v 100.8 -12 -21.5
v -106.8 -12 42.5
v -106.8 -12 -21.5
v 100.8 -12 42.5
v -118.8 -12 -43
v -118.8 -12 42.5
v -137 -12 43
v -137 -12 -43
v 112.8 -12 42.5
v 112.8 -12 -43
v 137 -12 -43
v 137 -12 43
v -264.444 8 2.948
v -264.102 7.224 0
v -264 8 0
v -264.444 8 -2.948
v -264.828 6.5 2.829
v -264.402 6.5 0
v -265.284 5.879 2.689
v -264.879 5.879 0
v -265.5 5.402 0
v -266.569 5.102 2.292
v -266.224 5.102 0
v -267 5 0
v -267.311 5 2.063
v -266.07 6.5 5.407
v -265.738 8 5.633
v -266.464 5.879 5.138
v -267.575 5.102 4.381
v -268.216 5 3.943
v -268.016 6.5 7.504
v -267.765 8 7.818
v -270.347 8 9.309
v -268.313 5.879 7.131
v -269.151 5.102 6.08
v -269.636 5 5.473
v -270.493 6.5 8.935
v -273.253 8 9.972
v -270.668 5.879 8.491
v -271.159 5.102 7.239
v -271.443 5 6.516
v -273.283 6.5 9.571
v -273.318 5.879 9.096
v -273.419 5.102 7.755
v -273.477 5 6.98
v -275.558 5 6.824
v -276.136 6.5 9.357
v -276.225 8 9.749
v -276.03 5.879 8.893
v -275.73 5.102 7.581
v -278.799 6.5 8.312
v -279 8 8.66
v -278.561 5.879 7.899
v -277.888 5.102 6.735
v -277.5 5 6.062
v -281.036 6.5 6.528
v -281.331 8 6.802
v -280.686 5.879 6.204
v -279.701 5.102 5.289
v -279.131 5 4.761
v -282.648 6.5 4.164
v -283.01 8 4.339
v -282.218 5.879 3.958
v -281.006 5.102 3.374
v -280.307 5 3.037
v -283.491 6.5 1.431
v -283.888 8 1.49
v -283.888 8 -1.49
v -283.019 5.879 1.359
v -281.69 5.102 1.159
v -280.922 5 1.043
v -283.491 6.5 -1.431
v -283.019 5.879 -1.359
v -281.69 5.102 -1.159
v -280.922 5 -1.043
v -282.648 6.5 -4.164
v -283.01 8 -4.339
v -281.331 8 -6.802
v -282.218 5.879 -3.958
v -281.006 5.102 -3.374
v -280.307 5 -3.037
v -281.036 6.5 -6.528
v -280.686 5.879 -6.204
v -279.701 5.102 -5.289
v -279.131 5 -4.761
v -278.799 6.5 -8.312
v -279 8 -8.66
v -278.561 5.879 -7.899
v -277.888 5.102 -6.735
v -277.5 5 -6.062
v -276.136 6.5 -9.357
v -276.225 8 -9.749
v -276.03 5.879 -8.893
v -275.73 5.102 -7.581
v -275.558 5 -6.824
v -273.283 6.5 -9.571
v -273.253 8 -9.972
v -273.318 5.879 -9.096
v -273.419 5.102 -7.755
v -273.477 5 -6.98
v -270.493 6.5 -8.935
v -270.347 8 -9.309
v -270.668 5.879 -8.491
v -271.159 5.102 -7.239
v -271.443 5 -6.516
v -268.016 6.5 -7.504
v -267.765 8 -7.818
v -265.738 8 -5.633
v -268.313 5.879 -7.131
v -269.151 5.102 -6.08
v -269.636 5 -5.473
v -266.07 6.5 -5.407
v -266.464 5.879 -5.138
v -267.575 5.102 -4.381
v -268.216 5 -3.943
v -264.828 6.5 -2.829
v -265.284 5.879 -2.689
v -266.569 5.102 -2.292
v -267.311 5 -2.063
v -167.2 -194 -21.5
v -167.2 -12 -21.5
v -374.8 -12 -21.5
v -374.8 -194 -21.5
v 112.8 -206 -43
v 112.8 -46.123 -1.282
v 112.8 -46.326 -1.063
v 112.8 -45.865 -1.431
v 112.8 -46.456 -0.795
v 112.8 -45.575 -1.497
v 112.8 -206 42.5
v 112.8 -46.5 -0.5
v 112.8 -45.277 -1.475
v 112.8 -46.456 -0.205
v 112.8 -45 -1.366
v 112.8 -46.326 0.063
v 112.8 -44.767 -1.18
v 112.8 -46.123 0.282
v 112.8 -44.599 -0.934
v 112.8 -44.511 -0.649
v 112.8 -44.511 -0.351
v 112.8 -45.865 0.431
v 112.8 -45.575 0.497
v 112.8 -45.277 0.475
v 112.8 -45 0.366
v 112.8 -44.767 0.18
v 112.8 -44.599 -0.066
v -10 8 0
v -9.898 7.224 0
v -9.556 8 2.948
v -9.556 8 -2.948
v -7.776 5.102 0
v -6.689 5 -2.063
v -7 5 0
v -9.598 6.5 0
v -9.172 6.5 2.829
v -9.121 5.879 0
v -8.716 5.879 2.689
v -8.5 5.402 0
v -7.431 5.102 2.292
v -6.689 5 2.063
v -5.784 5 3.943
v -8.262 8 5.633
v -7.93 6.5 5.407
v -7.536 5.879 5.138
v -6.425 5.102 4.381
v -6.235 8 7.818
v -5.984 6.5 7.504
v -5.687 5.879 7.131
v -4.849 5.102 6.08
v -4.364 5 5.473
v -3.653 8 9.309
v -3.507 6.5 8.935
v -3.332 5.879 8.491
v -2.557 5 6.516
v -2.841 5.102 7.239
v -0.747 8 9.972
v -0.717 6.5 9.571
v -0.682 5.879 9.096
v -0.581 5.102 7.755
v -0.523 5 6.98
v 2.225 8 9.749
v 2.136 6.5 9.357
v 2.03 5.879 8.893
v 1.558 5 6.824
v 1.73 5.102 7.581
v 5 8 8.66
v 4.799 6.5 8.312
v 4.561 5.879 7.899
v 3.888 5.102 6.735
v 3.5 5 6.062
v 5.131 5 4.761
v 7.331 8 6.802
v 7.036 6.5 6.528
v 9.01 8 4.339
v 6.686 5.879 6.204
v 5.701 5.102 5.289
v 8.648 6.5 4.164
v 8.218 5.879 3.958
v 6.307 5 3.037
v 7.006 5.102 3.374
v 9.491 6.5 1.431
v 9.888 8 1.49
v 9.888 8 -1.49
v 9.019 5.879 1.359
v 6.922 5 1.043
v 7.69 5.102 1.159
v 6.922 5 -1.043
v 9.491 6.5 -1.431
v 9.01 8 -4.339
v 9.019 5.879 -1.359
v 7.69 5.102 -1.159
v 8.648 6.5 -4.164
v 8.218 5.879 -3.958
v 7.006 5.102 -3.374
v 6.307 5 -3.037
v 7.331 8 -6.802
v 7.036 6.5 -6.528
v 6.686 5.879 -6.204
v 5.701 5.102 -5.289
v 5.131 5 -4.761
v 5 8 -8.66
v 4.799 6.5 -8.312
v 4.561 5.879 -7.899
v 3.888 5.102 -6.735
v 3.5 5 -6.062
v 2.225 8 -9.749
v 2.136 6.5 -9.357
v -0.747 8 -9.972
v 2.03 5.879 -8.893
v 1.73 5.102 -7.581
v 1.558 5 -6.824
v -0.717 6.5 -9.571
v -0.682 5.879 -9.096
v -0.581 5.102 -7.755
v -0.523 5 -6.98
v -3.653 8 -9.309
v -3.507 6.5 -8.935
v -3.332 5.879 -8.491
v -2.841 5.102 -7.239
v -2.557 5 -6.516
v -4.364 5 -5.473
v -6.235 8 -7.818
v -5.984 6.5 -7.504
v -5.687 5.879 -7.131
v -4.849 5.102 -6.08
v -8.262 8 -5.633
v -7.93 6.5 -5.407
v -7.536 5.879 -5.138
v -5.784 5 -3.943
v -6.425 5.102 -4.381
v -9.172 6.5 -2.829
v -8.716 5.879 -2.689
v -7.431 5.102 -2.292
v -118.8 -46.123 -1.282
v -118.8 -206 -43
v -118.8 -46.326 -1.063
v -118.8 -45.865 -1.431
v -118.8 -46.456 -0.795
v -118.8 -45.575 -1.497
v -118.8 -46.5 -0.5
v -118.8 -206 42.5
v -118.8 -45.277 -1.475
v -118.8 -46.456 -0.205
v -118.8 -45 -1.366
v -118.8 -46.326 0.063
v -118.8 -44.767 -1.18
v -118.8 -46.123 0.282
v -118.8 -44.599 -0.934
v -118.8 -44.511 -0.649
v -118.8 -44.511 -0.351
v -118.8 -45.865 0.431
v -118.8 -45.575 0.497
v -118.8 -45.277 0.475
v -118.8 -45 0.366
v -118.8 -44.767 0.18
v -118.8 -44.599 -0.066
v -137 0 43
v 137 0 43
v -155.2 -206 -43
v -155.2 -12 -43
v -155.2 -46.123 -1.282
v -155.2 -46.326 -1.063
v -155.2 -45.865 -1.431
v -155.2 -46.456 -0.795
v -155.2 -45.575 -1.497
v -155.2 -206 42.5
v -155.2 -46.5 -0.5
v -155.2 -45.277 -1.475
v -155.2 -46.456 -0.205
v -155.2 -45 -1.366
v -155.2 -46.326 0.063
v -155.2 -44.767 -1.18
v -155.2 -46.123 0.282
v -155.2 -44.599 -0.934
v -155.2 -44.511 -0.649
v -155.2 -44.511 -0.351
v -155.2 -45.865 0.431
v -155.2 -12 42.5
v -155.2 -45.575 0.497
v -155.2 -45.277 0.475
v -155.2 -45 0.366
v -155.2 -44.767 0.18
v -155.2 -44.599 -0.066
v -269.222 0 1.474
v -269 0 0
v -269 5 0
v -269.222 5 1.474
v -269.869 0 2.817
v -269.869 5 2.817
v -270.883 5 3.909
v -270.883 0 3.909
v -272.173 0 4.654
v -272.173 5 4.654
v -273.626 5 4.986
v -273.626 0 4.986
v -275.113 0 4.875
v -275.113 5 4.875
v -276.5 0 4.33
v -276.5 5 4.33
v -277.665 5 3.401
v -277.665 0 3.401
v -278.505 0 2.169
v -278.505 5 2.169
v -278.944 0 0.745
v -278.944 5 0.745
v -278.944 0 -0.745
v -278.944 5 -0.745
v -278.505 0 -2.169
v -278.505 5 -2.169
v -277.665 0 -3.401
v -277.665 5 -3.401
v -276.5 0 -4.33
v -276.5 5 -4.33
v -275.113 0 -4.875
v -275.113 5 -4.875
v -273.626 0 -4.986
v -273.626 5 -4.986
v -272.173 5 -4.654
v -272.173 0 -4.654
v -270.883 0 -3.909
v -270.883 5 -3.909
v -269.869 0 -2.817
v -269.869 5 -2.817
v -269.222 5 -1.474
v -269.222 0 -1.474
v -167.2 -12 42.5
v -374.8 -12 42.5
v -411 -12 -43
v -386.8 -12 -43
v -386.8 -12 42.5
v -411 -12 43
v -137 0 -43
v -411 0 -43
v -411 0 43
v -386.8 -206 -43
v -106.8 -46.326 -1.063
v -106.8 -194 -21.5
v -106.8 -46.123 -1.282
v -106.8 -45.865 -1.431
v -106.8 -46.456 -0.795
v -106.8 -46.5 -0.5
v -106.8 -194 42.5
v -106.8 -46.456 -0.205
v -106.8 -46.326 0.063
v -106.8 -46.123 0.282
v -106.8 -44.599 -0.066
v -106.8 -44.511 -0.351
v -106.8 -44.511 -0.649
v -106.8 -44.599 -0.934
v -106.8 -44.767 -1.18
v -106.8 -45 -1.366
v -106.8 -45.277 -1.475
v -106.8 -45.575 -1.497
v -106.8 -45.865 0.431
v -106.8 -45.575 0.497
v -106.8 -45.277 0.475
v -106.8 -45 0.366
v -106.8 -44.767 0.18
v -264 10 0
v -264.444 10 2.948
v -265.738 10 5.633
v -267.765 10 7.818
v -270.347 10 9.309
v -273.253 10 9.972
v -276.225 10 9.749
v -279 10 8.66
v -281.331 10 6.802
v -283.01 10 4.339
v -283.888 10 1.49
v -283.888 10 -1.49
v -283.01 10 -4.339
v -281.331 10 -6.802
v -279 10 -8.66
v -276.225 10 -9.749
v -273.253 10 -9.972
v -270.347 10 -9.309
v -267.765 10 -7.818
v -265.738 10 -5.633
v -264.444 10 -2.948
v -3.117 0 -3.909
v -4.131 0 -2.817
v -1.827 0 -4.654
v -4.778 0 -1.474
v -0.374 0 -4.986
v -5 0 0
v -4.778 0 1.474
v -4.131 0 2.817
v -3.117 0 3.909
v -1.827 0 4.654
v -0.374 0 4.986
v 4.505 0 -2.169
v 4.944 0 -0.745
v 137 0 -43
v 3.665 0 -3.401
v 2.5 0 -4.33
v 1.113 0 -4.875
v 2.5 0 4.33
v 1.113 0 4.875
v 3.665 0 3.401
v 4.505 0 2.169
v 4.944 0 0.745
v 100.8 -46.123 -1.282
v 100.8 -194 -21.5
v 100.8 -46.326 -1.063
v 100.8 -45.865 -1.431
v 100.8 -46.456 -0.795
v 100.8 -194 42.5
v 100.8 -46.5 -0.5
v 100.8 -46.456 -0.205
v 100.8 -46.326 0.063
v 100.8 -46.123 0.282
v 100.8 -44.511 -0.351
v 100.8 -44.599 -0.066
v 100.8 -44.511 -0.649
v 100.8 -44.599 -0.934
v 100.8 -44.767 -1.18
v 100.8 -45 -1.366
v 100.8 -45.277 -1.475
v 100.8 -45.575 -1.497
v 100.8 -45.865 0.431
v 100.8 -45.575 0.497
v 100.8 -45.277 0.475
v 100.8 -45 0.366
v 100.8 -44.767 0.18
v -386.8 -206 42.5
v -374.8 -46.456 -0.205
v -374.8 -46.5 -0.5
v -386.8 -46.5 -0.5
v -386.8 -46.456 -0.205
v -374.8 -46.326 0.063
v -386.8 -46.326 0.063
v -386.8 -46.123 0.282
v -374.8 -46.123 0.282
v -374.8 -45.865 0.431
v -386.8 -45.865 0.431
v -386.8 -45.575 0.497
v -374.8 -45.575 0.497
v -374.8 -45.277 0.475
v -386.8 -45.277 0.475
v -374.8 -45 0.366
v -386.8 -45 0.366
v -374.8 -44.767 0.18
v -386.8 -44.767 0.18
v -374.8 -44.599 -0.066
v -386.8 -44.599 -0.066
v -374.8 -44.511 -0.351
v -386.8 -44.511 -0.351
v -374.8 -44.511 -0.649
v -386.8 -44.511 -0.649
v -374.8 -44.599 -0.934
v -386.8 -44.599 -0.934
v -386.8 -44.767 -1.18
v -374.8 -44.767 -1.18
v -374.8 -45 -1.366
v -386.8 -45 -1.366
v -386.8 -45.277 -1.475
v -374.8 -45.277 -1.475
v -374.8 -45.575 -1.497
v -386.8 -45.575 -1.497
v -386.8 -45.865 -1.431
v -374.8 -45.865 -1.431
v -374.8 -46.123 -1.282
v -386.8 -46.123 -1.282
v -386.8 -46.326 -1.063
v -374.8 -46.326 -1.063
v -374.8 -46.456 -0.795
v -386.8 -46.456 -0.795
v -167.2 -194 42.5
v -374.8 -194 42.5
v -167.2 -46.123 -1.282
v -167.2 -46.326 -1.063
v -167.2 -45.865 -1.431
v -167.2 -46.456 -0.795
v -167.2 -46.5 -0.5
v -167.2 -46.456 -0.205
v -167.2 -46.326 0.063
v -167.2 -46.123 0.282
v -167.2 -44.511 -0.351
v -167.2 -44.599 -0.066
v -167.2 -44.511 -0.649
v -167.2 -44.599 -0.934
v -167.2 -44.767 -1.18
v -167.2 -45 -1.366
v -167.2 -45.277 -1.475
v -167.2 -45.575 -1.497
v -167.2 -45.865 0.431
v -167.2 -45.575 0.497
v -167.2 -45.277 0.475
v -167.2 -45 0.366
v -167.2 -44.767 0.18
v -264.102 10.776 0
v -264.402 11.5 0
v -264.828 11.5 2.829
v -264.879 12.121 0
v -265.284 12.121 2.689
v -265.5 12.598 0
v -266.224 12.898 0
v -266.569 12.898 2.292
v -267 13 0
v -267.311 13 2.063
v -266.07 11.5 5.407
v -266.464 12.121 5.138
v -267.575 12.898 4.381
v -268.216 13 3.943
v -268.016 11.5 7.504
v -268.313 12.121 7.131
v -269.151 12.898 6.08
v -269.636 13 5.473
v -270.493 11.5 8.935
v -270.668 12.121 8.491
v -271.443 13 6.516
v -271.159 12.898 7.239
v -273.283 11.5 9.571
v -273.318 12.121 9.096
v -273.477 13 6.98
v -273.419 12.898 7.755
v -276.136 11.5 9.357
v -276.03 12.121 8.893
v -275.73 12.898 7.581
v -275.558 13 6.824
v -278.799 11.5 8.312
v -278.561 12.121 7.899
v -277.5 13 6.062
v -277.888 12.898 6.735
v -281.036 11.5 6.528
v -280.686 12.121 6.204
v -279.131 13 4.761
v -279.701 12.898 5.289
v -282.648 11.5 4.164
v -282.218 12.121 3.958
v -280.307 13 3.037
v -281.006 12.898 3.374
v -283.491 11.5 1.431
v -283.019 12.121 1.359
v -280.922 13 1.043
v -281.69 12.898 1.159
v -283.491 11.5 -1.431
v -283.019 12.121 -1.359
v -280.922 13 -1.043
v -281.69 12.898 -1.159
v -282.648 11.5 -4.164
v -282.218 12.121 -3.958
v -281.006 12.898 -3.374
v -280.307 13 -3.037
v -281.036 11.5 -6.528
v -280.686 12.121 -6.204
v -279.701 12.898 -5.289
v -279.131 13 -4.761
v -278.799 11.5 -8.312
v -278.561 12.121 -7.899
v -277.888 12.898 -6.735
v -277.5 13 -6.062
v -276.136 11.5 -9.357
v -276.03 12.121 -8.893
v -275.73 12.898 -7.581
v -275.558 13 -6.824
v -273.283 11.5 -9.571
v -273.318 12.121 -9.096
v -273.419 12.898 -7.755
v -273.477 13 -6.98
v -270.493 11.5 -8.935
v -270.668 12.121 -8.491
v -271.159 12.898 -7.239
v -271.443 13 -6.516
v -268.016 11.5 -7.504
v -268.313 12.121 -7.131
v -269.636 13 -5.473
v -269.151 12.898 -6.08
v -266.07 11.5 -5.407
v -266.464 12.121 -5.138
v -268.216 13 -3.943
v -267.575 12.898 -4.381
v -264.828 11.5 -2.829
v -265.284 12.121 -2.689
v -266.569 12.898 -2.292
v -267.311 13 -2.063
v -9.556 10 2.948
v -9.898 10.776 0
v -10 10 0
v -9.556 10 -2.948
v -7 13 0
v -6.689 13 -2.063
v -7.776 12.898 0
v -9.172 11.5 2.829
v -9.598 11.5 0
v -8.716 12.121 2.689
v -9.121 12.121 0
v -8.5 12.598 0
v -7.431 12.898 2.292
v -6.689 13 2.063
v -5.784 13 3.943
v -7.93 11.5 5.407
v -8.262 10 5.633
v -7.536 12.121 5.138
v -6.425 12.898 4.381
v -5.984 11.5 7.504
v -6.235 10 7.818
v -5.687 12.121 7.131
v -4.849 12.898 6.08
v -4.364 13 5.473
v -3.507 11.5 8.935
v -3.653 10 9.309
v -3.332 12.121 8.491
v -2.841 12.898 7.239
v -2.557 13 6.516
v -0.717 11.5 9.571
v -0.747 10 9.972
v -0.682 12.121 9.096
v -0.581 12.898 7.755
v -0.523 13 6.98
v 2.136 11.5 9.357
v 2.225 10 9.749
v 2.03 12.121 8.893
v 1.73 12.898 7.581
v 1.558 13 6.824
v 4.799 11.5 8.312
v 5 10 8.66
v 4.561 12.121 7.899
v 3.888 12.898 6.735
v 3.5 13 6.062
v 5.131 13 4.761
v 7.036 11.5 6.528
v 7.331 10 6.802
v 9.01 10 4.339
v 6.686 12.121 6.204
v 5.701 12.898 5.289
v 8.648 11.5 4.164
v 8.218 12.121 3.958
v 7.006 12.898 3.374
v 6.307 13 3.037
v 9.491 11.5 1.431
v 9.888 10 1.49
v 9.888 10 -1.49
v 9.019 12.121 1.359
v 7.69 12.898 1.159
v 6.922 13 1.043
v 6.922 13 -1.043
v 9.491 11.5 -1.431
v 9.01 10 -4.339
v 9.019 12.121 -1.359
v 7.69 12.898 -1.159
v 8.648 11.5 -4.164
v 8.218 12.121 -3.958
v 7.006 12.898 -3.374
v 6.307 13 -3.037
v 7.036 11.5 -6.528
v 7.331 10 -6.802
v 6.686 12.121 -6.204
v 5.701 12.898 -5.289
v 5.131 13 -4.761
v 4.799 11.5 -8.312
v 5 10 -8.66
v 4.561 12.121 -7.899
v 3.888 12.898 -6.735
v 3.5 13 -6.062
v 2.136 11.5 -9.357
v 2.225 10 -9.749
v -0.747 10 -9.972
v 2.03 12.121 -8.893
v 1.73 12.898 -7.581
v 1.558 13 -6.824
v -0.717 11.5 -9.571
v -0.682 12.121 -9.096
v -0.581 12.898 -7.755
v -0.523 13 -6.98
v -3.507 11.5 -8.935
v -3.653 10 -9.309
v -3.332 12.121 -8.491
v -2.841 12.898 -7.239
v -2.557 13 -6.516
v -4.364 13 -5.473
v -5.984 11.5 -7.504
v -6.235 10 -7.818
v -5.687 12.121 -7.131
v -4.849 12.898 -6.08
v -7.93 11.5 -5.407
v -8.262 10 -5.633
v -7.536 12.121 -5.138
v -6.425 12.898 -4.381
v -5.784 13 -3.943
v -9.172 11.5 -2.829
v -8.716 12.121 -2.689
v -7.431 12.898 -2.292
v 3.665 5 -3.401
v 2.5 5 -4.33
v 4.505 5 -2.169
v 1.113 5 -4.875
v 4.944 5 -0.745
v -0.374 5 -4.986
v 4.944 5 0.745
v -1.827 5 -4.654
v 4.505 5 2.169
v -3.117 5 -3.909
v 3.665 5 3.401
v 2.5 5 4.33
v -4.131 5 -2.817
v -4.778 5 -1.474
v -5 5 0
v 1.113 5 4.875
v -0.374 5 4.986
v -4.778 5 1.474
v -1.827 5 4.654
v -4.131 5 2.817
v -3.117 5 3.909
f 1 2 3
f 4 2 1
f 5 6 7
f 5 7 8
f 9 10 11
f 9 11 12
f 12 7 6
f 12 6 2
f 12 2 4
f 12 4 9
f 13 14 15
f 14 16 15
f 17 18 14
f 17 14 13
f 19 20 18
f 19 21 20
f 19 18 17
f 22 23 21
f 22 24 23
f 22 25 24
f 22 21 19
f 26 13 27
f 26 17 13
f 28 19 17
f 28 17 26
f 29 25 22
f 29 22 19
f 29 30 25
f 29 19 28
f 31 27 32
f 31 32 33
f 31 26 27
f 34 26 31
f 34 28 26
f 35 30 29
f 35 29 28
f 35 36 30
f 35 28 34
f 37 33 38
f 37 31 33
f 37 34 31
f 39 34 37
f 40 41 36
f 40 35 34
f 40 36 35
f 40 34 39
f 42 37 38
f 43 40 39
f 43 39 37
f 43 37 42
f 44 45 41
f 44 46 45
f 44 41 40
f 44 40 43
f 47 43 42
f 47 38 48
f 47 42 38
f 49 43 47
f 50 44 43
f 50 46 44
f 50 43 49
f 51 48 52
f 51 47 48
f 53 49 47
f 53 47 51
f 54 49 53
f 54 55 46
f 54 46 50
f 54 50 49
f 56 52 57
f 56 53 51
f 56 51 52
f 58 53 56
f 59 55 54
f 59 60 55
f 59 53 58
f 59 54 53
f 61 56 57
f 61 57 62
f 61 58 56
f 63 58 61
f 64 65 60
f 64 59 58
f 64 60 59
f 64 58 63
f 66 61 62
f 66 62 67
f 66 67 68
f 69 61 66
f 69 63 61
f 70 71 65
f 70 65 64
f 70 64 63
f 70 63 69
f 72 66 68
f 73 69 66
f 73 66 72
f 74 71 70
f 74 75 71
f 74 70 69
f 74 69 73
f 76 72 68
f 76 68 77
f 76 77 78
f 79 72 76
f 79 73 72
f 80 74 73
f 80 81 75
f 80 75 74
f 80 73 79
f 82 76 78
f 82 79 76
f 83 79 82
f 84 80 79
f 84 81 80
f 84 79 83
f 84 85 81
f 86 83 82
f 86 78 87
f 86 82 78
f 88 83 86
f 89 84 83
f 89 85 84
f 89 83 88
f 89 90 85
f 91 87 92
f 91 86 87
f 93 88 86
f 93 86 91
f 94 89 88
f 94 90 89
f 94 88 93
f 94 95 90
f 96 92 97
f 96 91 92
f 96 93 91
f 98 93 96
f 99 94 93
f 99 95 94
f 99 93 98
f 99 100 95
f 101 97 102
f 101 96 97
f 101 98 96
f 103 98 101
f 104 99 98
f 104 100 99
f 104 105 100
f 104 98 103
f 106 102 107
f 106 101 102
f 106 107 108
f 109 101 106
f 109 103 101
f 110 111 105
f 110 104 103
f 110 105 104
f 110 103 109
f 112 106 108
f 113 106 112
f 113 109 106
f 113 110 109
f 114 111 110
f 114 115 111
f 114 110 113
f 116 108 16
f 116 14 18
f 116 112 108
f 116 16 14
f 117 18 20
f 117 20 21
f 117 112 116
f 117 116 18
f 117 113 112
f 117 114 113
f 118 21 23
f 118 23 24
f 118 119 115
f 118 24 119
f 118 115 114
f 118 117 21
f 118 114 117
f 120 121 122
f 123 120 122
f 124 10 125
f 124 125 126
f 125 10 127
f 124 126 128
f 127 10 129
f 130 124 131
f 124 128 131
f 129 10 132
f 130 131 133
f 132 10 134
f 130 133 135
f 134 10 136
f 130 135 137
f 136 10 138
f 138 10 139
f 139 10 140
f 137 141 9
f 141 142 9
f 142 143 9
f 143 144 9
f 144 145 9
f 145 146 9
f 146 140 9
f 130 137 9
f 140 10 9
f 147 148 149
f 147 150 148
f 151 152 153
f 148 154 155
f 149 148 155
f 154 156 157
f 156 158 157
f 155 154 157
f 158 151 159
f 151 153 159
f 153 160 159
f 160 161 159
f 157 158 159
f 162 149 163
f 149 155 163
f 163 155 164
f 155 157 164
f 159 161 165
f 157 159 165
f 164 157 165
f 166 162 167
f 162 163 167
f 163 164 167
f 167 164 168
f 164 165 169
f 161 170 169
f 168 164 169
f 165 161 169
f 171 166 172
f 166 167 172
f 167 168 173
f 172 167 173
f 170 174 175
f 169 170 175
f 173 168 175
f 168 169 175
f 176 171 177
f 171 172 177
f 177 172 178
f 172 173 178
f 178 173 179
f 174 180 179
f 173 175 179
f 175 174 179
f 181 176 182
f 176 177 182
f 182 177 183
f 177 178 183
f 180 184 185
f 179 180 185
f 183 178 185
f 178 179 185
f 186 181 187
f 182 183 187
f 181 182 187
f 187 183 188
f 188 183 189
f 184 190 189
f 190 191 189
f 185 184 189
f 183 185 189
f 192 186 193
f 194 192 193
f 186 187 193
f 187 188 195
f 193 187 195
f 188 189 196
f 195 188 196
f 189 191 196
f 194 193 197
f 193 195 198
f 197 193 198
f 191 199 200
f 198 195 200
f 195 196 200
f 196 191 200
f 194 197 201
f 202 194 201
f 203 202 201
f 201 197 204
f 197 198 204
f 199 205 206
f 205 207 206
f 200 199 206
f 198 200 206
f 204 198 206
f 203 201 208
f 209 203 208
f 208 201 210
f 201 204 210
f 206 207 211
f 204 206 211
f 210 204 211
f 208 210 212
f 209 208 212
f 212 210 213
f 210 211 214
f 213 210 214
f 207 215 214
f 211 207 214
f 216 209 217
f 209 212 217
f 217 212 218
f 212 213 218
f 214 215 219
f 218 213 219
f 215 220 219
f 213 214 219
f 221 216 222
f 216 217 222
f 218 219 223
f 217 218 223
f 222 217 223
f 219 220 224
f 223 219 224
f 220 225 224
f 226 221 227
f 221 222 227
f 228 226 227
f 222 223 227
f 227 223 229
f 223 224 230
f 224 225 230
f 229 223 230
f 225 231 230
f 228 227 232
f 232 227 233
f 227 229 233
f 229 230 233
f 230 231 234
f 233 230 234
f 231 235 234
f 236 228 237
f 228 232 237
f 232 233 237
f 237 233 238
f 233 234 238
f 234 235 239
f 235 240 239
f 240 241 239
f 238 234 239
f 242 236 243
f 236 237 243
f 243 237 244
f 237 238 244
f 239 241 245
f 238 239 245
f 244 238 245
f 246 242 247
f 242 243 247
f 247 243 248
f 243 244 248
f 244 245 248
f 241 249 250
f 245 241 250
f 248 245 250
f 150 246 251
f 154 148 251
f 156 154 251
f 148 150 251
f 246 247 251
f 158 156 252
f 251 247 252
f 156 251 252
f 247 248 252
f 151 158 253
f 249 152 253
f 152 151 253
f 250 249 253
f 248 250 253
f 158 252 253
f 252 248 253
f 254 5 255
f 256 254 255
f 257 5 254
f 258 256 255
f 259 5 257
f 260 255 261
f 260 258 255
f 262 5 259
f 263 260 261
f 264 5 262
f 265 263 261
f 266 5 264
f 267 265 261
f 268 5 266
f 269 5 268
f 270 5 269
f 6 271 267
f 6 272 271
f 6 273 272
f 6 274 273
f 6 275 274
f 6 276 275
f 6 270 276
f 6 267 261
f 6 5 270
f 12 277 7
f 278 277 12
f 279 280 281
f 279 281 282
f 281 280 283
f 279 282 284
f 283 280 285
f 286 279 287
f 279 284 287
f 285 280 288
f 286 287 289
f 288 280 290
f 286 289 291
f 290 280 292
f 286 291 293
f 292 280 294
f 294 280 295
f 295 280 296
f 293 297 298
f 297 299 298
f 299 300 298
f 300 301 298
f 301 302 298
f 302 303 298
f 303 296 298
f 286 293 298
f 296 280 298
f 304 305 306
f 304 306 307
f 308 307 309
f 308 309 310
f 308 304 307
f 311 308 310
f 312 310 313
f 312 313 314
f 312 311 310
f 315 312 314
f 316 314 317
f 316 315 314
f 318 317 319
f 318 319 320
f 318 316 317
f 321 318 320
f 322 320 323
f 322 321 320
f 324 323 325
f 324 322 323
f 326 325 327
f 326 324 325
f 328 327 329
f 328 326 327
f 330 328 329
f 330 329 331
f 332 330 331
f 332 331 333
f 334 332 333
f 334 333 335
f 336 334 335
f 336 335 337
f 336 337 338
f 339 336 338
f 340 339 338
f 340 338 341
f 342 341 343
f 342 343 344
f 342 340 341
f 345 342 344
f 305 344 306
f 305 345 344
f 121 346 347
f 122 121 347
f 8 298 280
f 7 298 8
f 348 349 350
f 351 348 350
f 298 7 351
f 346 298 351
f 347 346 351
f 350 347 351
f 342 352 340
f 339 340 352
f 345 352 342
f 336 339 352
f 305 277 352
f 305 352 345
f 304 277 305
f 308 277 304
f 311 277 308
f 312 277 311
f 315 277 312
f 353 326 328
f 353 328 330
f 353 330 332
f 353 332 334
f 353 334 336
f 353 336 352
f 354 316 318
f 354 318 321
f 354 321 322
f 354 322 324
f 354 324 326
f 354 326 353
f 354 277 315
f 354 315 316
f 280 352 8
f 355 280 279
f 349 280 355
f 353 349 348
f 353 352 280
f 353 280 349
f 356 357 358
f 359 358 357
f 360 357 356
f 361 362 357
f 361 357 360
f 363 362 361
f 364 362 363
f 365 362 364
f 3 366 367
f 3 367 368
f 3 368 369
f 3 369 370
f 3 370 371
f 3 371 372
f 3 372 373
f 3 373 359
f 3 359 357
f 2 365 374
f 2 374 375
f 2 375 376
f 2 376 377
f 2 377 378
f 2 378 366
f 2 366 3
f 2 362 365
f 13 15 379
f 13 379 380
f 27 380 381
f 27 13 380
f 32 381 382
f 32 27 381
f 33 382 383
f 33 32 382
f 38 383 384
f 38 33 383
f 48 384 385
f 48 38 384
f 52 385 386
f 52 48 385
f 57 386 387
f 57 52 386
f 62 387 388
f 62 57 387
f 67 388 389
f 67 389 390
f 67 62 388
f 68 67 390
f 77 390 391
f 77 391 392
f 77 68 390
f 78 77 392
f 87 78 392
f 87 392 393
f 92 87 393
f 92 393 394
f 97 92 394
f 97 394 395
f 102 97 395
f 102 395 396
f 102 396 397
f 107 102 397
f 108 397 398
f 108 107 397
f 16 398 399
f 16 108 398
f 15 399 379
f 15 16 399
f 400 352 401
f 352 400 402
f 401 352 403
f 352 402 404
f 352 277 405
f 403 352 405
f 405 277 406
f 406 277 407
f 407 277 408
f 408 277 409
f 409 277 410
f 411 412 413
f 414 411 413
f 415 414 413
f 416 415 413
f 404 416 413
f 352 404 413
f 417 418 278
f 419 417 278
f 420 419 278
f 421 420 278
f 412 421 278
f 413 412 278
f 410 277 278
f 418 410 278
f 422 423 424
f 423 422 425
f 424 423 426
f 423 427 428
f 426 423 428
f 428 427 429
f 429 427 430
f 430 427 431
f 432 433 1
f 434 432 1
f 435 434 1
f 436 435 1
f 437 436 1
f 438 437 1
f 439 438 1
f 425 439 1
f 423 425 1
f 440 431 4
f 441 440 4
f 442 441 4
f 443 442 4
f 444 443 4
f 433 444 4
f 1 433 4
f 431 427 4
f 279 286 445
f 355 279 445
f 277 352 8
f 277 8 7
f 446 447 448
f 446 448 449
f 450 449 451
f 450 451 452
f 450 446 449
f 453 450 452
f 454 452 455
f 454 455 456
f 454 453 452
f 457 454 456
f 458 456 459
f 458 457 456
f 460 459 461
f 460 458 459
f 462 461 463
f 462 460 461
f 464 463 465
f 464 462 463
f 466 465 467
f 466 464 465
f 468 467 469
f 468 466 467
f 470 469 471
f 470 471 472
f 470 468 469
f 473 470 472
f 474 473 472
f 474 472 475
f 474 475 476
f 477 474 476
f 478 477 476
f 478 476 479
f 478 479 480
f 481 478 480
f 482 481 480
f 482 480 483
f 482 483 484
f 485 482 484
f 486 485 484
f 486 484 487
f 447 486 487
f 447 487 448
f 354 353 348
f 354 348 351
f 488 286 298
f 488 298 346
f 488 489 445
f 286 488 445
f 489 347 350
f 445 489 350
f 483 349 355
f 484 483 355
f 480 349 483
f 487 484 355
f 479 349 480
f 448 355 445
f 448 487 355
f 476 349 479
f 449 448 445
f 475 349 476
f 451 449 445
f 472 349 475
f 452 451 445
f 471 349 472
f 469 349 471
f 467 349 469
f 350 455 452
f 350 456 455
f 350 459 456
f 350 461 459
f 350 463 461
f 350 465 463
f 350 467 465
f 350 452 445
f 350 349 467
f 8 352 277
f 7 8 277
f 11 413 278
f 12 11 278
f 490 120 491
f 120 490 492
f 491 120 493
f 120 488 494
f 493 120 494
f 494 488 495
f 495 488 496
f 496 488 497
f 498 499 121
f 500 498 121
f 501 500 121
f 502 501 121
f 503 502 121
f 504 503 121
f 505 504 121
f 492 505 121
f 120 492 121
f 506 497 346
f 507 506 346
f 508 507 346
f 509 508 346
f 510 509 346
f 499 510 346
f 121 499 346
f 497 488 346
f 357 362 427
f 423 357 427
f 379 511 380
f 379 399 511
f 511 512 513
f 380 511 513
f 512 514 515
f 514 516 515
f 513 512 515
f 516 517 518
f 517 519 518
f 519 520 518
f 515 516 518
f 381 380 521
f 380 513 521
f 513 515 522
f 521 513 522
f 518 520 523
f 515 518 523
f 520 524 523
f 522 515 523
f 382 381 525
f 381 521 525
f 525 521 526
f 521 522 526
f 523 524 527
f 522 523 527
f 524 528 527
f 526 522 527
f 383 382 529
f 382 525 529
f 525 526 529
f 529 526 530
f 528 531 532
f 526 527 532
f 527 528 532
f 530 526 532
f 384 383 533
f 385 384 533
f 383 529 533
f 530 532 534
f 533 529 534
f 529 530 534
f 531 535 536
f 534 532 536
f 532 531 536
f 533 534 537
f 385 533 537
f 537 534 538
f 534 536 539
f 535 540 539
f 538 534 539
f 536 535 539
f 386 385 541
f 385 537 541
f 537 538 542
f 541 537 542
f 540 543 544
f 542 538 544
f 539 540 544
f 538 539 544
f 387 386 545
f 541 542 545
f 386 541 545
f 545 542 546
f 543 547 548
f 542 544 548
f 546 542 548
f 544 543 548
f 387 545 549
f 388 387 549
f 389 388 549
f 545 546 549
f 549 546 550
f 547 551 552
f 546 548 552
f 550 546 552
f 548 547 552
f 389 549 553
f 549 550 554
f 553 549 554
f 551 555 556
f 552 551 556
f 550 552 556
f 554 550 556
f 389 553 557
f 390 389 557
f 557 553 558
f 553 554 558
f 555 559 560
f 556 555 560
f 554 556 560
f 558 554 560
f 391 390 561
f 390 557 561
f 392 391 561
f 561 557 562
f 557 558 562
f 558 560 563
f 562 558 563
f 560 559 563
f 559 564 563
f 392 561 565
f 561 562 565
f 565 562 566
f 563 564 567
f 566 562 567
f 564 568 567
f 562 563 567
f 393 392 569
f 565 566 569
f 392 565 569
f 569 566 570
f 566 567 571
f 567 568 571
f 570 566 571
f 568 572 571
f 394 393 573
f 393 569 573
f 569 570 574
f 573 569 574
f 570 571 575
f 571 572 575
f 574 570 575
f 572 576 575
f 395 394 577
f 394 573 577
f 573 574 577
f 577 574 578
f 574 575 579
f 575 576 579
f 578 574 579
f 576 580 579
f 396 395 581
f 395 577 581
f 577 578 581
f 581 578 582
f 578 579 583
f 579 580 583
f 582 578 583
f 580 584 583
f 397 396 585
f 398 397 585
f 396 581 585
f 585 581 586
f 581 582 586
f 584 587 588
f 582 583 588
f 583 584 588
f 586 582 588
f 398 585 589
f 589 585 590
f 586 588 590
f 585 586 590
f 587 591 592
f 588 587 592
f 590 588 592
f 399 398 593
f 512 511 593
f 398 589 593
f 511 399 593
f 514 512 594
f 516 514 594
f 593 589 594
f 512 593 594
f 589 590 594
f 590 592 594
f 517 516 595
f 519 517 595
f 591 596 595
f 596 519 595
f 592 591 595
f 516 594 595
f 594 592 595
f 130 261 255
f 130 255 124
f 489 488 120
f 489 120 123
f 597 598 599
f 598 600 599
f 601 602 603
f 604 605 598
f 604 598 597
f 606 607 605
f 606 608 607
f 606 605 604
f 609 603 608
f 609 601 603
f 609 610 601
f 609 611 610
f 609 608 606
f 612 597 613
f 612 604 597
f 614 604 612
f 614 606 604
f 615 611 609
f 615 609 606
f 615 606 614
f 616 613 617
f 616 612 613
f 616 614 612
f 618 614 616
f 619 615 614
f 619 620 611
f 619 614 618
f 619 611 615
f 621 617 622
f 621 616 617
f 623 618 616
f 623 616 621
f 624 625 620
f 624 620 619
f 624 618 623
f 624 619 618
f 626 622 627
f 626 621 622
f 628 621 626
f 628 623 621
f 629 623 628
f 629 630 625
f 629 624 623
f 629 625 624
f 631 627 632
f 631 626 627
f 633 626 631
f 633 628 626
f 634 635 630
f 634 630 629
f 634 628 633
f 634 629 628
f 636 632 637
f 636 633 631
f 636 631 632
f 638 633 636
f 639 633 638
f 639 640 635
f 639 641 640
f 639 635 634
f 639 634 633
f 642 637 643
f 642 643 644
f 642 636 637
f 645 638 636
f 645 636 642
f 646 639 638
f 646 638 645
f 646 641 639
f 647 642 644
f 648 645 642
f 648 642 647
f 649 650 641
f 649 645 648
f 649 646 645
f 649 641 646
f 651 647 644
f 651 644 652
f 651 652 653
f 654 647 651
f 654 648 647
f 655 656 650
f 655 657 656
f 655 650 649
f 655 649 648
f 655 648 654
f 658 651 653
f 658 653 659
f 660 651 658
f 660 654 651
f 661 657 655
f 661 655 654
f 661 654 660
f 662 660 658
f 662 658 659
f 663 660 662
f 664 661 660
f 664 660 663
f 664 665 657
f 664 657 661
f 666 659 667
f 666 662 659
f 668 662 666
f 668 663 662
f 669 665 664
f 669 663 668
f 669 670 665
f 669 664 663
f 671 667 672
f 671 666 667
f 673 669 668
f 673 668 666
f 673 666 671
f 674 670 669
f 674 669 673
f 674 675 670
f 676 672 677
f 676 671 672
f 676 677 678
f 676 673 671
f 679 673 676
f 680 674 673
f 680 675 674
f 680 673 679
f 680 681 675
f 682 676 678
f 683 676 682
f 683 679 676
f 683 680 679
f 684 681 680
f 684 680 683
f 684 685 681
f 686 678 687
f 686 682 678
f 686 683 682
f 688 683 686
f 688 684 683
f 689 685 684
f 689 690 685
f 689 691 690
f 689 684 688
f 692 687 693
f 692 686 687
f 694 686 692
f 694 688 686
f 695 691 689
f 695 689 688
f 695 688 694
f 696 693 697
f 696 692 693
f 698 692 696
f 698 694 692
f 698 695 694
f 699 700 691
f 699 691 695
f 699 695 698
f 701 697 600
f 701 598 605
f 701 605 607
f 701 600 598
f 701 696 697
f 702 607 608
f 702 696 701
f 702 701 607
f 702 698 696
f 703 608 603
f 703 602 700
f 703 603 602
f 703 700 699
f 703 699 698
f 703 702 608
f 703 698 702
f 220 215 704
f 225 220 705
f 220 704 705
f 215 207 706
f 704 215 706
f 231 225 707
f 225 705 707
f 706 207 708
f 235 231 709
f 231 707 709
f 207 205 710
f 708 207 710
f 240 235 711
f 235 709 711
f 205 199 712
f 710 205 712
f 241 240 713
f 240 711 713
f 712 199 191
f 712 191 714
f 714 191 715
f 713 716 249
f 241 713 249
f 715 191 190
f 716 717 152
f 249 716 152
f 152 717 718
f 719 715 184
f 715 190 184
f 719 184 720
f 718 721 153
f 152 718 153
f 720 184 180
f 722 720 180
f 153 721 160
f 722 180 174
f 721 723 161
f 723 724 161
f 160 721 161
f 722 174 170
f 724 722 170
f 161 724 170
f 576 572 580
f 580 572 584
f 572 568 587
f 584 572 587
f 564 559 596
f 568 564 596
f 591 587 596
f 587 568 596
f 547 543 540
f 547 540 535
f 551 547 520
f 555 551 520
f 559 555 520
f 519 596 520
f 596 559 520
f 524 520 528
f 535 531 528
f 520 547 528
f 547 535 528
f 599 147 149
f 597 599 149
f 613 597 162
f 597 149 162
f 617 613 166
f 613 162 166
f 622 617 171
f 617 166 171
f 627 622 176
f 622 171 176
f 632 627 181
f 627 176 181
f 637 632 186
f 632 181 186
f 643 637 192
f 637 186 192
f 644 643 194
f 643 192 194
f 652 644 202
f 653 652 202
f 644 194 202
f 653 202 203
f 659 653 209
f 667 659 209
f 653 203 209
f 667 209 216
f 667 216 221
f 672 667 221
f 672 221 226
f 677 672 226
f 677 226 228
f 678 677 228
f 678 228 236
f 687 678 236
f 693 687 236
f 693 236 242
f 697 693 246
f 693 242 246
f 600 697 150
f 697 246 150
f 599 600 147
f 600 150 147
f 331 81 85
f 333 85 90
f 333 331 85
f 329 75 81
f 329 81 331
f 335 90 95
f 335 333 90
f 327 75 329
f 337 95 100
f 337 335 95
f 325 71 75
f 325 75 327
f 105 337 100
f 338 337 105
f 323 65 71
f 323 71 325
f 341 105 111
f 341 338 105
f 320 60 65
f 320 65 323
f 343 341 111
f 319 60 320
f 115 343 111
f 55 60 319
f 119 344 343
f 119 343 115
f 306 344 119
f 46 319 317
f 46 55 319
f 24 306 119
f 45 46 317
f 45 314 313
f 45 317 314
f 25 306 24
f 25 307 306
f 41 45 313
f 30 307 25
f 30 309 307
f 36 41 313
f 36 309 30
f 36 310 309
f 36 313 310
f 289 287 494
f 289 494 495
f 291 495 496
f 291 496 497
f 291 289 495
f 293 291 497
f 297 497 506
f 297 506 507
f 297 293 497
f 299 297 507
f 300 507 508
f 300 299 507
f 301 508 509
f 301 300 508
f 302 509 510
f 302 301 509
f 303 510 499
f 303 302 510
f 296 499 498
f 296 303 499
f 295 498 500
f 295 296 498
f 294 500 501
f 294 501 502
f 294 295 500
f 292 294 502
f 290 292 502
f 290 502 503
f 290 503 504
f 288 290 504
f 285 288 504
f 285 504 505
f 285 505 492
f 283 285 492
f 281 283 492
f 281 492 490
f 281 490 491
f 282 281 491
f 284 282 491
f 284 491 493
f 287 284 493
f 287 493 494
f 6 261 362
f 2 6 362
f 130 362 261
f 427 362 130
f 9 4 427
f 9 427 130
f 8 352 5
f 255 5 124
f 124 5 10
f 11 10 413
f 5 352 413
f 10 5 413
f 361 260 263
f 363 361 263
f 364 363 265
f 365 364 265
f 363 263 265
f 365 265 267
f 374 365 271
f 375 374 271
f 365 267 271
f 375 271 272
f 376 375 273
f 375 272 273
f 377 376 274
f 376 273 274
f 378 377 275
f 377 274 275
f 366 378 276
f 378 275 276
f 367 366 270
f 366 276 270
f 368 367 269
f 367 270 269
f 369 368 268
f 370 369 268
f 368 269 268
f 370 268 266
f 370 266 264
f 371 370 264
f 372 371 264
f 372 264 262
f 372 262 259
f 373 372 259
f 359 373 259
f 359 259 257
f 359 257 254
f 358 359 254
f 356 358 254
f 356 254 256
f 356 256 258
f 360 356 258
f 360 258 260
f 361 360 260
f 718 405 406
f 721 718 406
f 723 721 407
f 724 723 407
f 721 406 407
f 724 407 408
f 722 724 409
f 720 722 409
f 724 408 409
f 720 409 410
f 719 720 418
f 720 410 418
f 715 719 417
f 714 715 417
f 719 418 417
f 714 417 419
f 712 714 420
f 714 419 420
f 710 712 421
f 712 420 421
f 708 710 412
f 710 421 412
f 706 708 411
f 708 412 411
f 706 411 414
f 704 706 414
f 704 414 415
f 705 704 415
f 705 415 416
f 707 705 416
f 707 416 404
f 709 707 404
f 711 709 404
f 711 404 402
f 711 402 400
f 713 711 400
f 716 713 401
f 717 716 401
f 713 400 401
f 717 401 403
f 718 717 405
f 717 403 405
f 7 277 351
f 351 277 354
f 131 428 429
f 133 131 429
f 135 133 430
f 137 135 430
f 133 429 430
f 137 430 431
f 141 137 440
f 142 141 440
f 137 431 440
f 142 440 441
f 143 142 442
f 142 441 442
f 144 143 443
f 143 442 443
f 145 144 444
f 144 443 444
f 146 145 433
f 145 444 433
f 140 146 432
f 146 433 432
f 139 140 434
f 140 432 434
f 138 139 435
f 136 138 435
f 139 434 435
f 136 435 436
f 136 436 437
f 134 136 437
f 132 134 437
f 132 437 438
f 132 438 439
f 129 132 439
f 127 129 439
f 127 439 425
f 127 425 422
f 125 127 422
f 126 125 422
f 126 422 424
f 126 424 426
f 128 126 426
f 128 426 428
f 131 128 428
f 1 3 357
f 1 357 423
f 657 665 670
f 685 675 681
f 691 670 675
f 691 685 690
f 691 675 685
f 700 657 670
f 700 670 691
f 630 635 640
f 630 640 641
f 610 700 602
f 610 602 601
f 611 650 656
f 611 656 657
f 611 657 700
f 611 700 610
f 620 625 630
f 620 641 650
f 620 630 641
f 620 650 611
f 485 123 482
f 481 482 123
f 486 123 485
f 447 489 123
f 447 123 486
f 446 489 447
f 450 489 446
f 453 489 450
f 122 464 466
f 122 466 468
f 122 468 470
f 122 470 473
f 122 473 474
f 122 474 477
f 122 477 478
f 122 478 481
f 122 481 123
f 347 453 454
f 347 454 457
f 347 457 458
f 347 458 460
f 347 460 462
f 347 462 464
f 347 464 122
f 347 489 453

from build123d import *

# Parameters (mm, degrees)
F0_W     = 274
F0_H     = 86
F1_DEPTH = 12
F2_W     = 231.6
F2_H     = 85.5
F3_DEPTH = 194
F4_W     = 207.6
F4_H     = 182
F5_DEPTH = 64
F6_R     = 5
F7_DEPTH = 5
F13_R    = 10
F13_R_2  = 5
F8_DEPTH = 8
F14_R    = 3
F10_D    = 2


with BuildPart() as f1:
    # F0 (on Front) → F1 (new body)
    with BuildSketch(Plane.XZ):
        Rectangle(F0_W, F0_H)
    extrude(amount=F1_DEPTH)

    # F2 (on face) → F3 (join)
    with BuildSketch(Plane.XZ.offset(12)):
        with Locations((-3, -0.25)):
            Rectangle(F2_W, F2_H)
    extrude(amount=F3_DEPTH)

    # F4 (on face) → F5 (cut)
    with BuildSketch(Plane.XY.offset(42.5)):
        with Locations((-3, -103)):
            Rectangle(F4_W, F4_H)
    extrude(amount=-F5_DEPTH, mode=Mode.SUBTRACT)

    # F6 (on face) → F7 (join)
    with BuildSketch(Plane(origin=(0, 0, 0), x_dir=(-1, 0, 0), z_dir=(0, 1, 0))):
        Circle(F6_R)
    extrude(amount=F7_DEPTH)

    # F13 (on face) → F8 (join)
    with BuildSketch(Plane(origin=(0, 5, 0), x_dir=(-1, 0, 0), z_dir=(0, 1, 0))):
        Circle(F13_R)
        Circle(F13_R_2, mode=Mode.SUBTRACT)
        Circle(F13_R_2)
    extrude(amount=F8_DEPTH)

    # F14
    f14_edges = [f1.edges().sort_by_distance(p)[0] for p in [
        (10, 13, 0),
        (10, 5, 0),
    ]]
    fillet(f14_edges, radius=F14_R)

    # F10 (through all)
    with Locations(Plane.YZ.offset(112.8)):
        with Locations((-45.5, -0.5)):
            Hole(F10_D / 2)


with BuildPart() as f12_1:
    # F12: instance of F1
    add(f1.part.mirror(Plane(origin=(-137, -6, 0), x_dir=(0, -1, 0), z_dir=(-1, 0, 0))))


solid = Compound([f1.part, f12_1.part])
